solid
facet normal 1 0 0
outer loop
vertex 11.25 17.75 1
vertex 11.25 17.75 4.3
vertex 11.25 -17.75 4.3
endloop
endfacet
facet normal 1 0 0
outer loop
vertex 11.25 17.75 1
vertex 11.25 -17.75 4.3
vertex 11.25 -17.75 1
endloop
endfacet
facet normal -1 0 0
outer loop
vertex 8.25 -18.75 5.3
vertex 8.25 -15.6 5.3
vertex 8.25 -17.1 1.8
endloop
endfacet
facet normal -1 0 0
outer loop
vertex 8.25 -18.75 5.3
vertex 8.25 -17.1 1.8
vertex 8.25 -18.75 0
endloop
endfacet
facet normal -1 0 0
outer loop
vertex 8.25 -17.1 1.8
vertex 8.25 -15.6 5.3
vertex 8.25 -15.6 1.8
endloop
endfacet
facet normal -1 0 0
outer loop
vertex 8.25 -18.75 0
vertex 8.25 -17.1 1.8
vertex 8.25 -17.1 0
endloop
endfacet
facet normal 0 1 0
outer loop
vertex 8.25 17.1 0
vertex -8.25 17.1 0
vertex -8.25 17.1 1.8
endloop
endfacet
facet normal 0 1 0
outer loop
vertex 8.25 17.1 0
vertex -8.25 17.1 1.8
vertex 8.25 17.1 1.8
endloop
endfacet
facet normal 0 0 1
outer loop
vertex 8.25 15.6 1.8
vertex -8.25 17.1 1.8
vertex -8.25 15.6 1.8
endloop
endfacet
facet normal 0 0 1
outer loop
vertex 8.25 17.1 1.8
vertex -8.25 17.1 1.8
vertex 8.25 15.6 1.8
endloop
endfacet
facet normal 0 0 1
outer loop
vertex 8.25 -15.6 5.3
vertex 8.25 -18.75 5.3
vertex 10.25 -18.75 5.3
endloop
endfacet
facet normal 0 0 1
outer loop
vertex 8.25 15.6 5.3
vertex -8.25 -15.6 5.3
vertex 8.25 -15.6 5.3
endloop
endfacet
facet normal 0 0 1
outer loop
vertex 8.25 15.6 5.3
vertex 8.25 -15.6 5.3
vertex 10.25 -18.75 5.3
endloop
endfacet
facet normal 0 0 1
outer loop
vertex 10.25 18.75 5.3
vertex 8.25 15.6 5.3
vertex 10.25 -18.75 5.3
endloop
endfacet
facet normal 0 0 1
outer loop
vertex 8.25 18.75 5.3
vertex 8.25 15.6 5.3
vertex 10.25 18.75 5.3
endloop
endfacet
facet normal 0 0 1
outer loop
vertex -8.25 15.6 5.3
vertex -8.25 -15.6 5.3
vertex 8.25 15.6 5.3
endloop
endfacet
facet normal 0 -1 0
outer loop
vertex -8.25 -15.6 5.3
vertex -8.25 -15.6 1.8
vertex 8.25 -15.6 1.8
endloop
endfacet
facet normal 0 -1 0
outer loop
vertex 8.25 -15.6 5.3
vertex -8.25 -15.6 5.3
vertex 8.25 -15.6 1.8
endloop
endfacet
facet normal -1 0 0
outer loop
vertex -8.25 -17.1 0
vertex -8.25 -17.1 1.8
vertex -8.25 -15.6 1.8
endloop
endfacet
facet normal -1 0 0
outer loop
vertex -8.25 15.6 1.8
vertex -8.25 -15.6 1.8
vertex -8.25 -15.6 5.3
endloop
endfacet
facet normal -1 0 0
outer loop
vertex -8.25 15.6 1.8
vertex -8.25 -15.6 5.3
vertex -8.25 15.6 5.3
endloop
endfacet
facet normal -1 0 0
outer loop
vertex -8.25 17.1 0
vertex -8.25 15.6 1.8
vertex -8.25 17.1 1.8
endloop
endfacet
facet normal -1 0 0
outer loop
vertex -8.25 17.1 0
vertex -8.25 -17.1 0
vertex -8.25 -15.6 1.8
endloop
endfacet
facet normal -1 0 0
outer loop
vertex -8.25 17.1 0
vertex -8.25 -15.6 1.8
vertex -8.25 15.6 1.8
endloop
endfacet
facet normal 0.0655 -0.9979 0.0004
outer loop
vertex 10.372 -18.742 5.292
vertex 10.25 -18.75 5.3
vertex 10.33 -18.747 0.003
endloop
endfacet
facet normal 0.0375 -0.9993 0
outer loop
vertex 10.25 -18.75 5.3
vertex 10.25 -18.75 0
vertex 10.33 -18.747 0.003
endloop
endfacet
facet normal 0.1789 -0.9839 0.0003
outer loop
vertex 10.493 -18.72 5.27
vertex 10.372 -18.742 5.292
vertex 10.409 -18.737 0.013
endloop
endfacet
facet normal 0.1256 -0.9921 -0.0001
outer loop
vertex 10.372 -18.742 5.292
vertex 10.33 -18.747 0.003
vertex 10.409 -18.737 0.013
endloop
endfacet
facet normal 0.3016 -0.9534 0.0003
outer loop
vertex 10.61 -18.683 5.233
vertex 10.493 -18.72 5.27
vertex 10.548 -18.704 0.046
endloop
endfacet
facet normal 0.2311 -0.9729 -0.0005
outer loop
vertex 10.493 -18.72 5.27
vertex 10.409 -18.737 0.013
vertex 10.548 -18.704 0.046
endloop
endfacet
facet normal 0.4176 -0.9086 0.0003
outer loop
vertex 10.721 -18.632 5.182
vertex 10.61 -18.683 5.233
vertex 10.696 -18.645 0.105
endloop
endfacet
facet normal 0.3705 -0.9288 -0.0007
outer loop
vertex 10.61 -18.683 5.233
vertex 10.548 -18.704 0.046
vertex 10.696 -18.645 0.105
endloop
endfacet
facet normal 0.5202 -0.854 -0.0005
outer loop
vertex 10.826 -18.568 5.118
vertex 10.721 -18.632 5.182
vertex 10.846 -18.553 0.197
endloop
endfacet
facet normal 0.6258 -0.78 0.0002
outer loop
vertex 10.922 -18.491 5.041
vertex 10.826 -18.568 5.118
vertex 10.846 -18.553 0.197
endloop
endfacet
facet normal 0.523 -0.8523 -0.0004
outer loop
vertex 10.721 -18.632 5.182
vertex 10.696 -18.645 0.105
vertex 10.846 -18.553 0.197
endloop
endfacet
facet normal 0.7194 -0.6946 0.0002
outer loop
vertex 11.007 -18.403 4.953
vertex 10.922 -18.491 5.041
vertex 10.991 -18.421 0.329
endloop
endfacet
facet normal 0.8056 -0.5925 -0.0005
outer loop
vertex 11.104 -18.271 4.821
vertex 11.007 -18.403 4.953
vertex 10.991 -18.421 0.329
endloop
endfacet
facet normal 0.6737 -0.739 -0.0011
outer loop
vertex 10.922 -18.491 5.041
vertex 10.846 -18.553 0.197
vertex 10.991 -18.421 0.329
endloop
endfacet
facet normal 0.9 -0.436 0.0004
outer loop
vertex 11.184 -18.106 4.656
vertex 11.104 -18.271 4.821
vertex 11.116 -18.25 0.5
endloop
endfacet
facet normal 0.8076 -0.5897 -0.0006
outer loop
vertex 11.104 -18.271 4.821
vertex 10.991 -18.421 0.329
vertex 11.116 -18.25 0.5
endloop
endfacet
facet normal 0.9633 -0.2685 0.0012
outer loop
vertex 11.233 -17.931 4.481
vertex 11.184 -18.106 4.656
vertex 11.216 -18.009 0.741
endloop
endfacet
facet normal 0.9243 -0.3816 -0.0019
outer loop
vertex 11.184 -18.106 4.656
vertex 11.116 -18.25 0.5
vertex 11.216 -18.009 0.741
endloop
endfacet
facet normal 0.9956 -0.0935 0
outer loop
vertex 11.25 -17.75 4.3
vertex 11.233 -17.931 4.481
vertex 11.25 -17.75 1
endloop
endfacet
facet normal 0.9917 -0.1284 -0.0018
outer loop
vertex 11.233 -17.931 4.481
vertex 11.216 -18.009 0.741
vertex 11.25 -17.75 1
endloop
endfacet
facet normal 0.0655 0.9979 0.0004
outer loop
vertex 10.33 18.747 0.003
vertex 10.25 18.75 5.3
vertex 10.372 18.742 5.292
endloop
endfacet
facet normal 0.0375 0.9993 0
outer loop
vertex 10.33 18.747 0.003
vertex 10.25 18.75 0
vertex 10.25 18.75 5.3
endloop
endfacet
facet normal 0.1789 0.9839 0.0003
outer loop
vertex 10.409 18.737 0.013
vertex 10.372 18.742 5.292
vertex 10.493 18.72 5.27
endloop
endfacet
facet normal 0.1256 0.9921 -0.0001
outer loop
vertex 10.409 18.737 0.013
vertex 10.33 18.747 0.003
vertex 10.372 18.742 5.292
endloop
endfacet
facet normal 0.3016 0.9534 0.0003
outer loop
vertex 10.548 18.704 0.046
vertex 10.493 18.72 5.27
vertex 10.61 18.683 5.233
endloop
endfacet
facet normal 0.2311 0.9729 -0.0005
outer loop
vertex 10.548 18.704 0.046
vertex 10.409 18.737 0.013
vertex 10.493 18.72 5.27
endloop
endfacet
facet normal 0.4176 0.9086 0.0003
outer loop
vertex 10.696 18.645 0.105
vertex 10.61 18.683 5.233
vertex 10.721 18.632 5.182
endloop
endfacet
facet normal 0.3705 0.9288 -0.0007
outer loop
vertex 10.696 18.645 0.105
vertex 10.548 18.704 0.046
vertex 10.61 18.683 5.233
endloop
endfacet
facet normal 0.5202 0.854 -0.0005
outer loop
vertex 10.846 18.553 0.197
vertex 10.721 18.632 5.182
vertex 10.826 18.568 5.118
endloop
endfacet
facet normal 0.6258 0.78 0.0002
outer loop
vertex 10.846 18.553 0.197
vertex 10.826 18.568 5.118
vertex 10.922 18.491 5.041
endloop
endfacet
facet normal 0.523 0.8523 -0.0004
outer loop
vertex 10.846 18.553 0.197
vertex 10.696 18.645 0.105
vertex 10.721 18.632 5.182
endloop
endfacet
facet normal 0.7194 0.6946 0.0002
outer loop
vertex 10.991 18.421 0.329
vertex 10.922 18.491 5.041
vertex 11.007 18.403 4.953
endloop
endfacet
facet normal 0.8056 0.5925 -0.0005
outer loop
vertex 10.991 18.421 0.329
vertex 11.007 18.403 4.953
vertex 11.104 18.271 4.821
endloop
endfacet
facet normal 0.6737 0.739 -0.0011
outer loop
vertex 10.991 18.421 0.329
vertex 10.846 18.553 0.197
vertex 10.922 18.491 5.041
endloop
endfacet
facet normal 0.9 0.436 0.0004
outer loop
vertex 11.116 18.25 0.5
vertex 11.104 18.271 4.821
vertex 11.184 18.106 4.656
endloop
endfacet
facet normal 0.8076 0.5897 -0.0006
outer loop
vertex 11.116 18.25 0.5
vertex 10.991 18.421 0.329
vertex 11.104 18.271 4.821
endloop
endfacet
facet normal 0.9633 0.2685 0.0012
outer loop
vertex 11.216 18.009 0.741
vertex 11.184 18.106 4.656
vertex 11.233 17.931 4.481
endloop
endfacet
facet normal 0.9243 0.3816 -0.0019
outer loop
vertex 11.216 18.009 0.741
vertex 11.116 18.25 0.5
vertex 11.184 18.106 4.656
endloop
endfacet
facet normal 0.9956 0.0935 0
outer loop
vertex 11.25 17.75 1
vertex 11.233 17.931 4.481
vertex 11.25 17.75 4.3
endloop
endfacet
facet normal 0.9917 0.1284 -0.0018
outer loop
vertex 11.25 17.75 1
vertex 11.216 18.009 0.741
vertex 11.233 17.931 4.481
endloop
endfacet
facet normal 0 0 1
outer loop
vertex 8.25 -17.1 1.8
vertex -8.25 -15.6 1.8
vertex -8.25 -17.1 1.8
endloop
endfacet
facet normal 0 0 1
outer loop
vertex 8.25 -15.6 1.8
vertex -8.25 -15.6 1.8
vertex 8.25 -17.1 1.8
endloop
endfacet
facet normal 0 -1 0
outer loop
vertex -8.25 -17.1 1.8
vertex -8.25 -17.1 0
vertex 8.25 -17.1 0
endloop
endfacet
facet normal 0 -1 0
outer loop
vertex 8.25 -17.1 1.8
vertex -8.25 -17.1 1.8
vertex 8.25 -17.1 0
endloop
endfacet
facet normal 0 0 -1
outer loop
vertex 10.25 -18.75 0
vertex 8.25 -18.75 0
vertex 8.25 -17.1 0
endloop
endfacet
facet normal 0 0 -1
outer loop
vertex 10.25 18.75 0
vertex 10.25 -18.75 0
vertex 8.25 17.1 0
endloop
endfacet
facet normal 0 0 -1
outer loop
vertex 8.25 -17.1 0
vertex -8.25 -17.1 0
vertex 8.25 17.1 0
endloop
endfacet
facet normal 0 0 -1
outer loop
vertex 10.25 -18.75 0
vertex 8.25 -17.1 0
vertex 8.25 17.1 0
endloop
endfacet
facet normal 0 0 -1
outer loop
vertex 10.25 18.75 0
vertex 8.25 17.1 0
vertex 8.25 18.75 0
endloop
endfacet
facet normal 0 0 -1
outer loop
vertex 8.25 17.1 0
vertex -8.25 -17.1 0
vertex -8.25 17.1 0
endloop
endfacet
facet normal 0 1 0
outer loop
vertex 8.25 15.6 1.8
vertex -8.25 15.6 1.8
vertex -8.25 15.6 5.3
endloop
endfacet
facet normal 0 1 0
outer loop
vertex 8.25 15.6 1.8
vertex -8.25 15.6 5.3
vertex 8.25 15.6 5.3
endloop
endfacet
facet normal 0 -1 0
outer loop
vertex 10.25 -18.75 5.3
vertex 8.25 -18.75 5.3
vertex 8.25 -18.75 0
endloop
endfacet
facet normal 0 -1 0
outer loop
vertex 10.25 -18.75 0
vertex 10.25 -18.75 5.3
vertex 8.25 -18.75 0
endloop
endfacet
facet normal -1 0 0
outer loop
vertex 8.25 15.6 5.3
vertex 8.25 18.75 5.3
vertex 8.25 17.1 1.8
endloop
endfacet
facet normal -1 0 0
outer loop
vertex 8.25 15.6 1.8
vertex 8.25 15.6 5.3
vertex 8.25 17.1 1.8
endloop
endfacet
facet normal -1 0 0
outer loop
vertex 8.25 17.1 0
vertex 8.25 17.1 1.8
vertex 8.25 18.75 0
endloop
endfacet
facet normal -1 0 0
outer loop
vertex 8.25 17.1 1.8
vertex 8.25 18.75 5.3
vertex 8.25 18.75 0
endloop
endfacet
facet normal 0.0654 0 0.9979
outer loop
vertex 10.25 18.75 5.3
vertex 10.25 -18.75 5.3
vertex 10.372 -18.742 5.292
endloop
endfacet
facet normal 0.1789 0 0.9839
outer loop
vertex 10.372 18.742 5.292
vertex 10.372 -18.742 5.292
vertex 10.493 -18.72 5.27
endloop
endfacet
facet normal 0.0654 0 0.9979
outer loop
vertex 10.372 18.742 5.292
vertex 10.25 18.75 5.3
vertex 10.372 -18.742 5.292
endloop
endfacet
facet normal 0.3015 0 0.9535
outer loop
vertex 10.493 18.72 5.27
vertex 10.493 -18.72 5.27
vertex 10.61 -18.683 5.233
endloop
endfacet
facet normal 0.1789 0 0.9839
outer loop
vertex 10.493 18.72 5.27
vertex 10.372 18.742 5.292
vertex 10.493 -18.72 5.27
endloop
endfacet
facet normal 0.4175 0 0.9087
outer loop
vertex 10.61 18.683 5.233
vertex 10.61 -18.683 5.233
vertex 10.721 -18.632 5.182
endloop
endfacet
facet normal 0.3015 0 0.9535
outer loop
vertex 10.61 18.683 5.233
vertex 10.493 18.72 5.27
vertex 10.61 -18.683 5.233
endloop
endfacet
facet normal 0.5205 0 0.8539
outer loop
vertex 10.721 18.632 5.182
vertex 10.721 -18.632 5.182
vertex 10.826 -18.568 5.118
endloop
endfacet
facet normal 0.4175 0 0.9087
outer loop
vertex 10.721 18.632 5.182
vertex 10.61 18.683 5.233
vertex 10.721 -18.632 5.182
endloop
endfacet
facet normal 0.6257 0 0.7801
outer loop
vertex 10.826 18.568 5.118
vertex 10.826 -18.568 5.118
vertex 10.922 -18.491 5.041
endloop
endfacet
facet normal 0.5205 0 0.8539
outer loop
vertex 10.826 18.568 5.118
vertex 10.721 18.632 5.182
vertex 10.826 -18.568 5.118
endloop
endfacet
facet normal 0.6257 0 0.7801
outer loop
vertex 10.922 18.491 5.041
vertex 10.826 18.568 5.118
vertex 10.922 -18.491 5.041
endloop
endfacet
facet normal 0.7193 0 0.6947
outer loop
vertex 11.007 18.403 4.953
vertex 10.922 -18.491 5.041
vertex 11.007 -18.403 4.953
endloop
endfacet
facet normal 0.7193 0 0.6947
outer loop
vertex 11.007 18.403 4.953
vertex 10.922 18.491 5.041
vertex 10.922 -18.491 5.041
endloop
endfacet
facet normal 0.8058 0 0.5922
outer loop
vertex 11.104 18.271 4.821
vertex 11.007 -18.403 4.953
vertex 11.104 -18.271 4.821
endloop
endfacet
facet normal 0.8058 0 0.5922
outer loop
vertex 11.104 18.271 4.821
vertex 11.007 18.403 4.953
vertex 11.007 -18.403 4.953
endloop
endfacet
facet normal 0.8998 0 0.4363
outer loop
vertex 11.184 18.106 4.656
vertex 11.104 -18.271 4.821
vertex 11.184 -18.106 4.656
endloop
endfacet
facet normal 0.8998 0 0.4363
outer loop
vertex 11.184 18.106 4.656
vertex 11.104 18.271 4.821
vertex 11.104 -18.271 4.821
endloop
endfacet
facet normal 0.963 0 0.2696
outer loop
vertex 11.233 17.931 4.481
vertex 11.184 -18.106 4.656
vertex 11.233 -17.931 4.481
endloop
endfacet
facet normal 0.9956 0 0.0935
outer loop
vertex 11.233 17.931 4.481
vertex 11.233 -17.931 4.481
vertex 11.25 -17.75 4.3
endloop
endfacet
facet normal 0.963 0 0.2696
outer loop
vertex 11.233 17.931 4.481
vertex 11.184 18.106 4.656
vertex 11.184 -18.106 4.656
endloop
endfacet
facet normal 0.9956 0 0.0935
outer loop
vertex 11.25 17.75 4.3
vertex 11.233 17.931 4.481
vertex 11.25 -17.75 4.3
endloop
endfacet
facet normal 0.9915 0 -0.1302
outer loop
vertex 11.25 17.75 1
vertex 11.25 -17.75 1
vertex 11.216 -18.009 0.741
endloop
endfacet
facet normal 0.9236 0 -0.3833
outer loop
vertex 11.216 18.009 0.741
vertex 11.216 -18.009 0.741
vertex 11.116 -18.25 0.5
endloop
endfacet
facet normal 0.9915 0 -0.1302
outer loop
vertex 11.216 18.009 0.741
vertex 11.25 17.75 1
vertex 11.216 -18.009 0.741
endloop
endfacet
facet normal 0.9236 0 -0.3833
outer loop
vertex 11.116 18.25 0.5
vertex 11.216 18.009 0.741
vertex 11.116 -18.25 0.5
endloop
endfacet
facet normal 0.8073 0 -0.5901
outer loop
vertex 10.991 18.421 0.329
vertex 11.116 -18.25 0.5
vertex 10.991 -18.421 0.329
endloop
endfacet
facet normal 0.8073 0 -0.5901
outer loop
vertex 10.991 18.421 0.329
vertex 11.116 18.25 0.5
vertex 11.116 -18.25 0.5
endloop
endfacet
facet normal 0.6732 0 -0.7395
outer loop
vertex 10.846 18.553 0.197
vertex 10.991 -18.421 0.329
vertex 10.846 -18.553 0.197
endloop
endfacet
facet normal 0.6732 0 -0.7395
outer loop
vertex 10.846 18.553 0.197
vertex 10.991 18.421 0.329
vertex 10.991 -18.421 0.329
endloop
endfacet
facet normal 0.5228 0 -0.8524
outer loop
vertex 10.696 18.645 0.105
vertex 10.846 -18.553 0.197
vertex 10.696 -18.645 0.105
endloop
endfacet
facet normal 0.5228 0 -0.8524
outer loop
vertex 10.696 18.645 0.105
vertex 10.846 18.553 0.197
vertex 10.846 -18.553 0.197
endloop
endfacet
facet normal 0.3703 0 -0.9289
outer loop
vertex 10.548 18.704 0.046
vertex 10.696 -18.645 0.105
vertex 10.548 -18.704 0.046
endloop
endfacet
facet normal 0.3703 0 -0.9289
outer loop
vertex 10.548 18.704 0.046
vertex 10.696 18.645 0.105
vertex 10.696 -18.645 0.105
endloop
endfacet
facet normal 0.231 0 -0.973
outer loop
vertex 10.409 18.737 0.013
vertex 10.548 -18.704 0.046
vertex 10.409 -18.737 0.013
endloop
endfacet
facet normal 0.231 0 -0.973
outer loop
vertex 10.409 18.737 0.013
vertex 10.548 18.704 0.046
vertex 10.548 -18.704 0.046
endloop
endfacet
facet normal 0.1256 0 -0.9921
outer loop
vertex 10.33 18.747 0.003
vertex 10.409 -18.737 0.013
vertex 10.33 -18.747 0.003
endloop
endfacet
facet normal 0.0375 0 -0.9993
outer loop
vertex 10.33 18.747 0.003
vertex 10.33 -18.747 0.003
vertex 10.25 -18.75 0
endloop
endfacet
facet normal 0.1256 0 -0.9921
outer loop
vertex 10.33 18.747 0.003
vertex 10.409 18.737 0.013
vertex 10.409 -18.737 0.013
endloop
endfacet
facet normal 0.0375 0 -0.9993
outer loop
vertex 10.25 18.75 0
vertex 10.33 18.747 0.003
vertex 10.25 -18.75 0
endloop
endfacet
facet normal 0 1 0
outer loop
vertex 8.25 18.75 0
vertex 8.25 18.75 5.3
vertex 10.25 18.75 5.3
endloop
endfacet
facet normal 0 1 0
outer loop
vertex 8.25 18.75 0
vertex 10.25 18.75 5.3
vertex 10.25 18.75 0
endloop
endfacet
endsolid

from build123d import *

# Parameters (mm, degrees)
SKETCH1_W   = 16.5
SKETCH1_H   = 34.2
INT_2_DEPTH = 1.8
SKETCH2_W   = 16.5
SKETCH2_H   = 31.2
EXT_DEPTH   = 3.5
SKETCH3_W   = 5.3
SKETCH3_H   = 37.5
TOP_DEPTH   = 3
FILLET1_R   = 1


with BuildPart() as part:
    # Sketch1 → Int 2 (new body)
    with BuildSketch(Plane.XY):
        Rectangle(SKETCH1_W, SKETCH1_H)
    extrude(amount=INT_2_DEPTH)

    # Sketch2 → Ext (add)
    with BuildSketch(Plane.XY.offset(1.8)):
        Rectangle(SKETCH2_W, SKETCH2_H)
    extrude(amount=EXT_DEPTH)

    # Sketch3 → Top (add)
    with BuildSketch(Plane(origin=(8.25, 0, 0), x_dir=(0, 0, -1), z_dir=(1, 0, 0))):
        with Locations((-2.65, 0)):
            Rectangle(SKETCH3_W, SKETCH3_H)
    extrude(amount=TOP_DEPTH)

    # Fillet1
    fillet1_edges = [part.edges().sort_by_distance(p)[0] for p in [
        (11.25, 0, 0),
        (11.25, 18.75, 2.65),
        (11.25, 0, 5.3),
        (11.25, -18.75, 2.65),
    ]]
    fillet(fillet1_edges, radius=FILLET1_R)


solid = part.part
